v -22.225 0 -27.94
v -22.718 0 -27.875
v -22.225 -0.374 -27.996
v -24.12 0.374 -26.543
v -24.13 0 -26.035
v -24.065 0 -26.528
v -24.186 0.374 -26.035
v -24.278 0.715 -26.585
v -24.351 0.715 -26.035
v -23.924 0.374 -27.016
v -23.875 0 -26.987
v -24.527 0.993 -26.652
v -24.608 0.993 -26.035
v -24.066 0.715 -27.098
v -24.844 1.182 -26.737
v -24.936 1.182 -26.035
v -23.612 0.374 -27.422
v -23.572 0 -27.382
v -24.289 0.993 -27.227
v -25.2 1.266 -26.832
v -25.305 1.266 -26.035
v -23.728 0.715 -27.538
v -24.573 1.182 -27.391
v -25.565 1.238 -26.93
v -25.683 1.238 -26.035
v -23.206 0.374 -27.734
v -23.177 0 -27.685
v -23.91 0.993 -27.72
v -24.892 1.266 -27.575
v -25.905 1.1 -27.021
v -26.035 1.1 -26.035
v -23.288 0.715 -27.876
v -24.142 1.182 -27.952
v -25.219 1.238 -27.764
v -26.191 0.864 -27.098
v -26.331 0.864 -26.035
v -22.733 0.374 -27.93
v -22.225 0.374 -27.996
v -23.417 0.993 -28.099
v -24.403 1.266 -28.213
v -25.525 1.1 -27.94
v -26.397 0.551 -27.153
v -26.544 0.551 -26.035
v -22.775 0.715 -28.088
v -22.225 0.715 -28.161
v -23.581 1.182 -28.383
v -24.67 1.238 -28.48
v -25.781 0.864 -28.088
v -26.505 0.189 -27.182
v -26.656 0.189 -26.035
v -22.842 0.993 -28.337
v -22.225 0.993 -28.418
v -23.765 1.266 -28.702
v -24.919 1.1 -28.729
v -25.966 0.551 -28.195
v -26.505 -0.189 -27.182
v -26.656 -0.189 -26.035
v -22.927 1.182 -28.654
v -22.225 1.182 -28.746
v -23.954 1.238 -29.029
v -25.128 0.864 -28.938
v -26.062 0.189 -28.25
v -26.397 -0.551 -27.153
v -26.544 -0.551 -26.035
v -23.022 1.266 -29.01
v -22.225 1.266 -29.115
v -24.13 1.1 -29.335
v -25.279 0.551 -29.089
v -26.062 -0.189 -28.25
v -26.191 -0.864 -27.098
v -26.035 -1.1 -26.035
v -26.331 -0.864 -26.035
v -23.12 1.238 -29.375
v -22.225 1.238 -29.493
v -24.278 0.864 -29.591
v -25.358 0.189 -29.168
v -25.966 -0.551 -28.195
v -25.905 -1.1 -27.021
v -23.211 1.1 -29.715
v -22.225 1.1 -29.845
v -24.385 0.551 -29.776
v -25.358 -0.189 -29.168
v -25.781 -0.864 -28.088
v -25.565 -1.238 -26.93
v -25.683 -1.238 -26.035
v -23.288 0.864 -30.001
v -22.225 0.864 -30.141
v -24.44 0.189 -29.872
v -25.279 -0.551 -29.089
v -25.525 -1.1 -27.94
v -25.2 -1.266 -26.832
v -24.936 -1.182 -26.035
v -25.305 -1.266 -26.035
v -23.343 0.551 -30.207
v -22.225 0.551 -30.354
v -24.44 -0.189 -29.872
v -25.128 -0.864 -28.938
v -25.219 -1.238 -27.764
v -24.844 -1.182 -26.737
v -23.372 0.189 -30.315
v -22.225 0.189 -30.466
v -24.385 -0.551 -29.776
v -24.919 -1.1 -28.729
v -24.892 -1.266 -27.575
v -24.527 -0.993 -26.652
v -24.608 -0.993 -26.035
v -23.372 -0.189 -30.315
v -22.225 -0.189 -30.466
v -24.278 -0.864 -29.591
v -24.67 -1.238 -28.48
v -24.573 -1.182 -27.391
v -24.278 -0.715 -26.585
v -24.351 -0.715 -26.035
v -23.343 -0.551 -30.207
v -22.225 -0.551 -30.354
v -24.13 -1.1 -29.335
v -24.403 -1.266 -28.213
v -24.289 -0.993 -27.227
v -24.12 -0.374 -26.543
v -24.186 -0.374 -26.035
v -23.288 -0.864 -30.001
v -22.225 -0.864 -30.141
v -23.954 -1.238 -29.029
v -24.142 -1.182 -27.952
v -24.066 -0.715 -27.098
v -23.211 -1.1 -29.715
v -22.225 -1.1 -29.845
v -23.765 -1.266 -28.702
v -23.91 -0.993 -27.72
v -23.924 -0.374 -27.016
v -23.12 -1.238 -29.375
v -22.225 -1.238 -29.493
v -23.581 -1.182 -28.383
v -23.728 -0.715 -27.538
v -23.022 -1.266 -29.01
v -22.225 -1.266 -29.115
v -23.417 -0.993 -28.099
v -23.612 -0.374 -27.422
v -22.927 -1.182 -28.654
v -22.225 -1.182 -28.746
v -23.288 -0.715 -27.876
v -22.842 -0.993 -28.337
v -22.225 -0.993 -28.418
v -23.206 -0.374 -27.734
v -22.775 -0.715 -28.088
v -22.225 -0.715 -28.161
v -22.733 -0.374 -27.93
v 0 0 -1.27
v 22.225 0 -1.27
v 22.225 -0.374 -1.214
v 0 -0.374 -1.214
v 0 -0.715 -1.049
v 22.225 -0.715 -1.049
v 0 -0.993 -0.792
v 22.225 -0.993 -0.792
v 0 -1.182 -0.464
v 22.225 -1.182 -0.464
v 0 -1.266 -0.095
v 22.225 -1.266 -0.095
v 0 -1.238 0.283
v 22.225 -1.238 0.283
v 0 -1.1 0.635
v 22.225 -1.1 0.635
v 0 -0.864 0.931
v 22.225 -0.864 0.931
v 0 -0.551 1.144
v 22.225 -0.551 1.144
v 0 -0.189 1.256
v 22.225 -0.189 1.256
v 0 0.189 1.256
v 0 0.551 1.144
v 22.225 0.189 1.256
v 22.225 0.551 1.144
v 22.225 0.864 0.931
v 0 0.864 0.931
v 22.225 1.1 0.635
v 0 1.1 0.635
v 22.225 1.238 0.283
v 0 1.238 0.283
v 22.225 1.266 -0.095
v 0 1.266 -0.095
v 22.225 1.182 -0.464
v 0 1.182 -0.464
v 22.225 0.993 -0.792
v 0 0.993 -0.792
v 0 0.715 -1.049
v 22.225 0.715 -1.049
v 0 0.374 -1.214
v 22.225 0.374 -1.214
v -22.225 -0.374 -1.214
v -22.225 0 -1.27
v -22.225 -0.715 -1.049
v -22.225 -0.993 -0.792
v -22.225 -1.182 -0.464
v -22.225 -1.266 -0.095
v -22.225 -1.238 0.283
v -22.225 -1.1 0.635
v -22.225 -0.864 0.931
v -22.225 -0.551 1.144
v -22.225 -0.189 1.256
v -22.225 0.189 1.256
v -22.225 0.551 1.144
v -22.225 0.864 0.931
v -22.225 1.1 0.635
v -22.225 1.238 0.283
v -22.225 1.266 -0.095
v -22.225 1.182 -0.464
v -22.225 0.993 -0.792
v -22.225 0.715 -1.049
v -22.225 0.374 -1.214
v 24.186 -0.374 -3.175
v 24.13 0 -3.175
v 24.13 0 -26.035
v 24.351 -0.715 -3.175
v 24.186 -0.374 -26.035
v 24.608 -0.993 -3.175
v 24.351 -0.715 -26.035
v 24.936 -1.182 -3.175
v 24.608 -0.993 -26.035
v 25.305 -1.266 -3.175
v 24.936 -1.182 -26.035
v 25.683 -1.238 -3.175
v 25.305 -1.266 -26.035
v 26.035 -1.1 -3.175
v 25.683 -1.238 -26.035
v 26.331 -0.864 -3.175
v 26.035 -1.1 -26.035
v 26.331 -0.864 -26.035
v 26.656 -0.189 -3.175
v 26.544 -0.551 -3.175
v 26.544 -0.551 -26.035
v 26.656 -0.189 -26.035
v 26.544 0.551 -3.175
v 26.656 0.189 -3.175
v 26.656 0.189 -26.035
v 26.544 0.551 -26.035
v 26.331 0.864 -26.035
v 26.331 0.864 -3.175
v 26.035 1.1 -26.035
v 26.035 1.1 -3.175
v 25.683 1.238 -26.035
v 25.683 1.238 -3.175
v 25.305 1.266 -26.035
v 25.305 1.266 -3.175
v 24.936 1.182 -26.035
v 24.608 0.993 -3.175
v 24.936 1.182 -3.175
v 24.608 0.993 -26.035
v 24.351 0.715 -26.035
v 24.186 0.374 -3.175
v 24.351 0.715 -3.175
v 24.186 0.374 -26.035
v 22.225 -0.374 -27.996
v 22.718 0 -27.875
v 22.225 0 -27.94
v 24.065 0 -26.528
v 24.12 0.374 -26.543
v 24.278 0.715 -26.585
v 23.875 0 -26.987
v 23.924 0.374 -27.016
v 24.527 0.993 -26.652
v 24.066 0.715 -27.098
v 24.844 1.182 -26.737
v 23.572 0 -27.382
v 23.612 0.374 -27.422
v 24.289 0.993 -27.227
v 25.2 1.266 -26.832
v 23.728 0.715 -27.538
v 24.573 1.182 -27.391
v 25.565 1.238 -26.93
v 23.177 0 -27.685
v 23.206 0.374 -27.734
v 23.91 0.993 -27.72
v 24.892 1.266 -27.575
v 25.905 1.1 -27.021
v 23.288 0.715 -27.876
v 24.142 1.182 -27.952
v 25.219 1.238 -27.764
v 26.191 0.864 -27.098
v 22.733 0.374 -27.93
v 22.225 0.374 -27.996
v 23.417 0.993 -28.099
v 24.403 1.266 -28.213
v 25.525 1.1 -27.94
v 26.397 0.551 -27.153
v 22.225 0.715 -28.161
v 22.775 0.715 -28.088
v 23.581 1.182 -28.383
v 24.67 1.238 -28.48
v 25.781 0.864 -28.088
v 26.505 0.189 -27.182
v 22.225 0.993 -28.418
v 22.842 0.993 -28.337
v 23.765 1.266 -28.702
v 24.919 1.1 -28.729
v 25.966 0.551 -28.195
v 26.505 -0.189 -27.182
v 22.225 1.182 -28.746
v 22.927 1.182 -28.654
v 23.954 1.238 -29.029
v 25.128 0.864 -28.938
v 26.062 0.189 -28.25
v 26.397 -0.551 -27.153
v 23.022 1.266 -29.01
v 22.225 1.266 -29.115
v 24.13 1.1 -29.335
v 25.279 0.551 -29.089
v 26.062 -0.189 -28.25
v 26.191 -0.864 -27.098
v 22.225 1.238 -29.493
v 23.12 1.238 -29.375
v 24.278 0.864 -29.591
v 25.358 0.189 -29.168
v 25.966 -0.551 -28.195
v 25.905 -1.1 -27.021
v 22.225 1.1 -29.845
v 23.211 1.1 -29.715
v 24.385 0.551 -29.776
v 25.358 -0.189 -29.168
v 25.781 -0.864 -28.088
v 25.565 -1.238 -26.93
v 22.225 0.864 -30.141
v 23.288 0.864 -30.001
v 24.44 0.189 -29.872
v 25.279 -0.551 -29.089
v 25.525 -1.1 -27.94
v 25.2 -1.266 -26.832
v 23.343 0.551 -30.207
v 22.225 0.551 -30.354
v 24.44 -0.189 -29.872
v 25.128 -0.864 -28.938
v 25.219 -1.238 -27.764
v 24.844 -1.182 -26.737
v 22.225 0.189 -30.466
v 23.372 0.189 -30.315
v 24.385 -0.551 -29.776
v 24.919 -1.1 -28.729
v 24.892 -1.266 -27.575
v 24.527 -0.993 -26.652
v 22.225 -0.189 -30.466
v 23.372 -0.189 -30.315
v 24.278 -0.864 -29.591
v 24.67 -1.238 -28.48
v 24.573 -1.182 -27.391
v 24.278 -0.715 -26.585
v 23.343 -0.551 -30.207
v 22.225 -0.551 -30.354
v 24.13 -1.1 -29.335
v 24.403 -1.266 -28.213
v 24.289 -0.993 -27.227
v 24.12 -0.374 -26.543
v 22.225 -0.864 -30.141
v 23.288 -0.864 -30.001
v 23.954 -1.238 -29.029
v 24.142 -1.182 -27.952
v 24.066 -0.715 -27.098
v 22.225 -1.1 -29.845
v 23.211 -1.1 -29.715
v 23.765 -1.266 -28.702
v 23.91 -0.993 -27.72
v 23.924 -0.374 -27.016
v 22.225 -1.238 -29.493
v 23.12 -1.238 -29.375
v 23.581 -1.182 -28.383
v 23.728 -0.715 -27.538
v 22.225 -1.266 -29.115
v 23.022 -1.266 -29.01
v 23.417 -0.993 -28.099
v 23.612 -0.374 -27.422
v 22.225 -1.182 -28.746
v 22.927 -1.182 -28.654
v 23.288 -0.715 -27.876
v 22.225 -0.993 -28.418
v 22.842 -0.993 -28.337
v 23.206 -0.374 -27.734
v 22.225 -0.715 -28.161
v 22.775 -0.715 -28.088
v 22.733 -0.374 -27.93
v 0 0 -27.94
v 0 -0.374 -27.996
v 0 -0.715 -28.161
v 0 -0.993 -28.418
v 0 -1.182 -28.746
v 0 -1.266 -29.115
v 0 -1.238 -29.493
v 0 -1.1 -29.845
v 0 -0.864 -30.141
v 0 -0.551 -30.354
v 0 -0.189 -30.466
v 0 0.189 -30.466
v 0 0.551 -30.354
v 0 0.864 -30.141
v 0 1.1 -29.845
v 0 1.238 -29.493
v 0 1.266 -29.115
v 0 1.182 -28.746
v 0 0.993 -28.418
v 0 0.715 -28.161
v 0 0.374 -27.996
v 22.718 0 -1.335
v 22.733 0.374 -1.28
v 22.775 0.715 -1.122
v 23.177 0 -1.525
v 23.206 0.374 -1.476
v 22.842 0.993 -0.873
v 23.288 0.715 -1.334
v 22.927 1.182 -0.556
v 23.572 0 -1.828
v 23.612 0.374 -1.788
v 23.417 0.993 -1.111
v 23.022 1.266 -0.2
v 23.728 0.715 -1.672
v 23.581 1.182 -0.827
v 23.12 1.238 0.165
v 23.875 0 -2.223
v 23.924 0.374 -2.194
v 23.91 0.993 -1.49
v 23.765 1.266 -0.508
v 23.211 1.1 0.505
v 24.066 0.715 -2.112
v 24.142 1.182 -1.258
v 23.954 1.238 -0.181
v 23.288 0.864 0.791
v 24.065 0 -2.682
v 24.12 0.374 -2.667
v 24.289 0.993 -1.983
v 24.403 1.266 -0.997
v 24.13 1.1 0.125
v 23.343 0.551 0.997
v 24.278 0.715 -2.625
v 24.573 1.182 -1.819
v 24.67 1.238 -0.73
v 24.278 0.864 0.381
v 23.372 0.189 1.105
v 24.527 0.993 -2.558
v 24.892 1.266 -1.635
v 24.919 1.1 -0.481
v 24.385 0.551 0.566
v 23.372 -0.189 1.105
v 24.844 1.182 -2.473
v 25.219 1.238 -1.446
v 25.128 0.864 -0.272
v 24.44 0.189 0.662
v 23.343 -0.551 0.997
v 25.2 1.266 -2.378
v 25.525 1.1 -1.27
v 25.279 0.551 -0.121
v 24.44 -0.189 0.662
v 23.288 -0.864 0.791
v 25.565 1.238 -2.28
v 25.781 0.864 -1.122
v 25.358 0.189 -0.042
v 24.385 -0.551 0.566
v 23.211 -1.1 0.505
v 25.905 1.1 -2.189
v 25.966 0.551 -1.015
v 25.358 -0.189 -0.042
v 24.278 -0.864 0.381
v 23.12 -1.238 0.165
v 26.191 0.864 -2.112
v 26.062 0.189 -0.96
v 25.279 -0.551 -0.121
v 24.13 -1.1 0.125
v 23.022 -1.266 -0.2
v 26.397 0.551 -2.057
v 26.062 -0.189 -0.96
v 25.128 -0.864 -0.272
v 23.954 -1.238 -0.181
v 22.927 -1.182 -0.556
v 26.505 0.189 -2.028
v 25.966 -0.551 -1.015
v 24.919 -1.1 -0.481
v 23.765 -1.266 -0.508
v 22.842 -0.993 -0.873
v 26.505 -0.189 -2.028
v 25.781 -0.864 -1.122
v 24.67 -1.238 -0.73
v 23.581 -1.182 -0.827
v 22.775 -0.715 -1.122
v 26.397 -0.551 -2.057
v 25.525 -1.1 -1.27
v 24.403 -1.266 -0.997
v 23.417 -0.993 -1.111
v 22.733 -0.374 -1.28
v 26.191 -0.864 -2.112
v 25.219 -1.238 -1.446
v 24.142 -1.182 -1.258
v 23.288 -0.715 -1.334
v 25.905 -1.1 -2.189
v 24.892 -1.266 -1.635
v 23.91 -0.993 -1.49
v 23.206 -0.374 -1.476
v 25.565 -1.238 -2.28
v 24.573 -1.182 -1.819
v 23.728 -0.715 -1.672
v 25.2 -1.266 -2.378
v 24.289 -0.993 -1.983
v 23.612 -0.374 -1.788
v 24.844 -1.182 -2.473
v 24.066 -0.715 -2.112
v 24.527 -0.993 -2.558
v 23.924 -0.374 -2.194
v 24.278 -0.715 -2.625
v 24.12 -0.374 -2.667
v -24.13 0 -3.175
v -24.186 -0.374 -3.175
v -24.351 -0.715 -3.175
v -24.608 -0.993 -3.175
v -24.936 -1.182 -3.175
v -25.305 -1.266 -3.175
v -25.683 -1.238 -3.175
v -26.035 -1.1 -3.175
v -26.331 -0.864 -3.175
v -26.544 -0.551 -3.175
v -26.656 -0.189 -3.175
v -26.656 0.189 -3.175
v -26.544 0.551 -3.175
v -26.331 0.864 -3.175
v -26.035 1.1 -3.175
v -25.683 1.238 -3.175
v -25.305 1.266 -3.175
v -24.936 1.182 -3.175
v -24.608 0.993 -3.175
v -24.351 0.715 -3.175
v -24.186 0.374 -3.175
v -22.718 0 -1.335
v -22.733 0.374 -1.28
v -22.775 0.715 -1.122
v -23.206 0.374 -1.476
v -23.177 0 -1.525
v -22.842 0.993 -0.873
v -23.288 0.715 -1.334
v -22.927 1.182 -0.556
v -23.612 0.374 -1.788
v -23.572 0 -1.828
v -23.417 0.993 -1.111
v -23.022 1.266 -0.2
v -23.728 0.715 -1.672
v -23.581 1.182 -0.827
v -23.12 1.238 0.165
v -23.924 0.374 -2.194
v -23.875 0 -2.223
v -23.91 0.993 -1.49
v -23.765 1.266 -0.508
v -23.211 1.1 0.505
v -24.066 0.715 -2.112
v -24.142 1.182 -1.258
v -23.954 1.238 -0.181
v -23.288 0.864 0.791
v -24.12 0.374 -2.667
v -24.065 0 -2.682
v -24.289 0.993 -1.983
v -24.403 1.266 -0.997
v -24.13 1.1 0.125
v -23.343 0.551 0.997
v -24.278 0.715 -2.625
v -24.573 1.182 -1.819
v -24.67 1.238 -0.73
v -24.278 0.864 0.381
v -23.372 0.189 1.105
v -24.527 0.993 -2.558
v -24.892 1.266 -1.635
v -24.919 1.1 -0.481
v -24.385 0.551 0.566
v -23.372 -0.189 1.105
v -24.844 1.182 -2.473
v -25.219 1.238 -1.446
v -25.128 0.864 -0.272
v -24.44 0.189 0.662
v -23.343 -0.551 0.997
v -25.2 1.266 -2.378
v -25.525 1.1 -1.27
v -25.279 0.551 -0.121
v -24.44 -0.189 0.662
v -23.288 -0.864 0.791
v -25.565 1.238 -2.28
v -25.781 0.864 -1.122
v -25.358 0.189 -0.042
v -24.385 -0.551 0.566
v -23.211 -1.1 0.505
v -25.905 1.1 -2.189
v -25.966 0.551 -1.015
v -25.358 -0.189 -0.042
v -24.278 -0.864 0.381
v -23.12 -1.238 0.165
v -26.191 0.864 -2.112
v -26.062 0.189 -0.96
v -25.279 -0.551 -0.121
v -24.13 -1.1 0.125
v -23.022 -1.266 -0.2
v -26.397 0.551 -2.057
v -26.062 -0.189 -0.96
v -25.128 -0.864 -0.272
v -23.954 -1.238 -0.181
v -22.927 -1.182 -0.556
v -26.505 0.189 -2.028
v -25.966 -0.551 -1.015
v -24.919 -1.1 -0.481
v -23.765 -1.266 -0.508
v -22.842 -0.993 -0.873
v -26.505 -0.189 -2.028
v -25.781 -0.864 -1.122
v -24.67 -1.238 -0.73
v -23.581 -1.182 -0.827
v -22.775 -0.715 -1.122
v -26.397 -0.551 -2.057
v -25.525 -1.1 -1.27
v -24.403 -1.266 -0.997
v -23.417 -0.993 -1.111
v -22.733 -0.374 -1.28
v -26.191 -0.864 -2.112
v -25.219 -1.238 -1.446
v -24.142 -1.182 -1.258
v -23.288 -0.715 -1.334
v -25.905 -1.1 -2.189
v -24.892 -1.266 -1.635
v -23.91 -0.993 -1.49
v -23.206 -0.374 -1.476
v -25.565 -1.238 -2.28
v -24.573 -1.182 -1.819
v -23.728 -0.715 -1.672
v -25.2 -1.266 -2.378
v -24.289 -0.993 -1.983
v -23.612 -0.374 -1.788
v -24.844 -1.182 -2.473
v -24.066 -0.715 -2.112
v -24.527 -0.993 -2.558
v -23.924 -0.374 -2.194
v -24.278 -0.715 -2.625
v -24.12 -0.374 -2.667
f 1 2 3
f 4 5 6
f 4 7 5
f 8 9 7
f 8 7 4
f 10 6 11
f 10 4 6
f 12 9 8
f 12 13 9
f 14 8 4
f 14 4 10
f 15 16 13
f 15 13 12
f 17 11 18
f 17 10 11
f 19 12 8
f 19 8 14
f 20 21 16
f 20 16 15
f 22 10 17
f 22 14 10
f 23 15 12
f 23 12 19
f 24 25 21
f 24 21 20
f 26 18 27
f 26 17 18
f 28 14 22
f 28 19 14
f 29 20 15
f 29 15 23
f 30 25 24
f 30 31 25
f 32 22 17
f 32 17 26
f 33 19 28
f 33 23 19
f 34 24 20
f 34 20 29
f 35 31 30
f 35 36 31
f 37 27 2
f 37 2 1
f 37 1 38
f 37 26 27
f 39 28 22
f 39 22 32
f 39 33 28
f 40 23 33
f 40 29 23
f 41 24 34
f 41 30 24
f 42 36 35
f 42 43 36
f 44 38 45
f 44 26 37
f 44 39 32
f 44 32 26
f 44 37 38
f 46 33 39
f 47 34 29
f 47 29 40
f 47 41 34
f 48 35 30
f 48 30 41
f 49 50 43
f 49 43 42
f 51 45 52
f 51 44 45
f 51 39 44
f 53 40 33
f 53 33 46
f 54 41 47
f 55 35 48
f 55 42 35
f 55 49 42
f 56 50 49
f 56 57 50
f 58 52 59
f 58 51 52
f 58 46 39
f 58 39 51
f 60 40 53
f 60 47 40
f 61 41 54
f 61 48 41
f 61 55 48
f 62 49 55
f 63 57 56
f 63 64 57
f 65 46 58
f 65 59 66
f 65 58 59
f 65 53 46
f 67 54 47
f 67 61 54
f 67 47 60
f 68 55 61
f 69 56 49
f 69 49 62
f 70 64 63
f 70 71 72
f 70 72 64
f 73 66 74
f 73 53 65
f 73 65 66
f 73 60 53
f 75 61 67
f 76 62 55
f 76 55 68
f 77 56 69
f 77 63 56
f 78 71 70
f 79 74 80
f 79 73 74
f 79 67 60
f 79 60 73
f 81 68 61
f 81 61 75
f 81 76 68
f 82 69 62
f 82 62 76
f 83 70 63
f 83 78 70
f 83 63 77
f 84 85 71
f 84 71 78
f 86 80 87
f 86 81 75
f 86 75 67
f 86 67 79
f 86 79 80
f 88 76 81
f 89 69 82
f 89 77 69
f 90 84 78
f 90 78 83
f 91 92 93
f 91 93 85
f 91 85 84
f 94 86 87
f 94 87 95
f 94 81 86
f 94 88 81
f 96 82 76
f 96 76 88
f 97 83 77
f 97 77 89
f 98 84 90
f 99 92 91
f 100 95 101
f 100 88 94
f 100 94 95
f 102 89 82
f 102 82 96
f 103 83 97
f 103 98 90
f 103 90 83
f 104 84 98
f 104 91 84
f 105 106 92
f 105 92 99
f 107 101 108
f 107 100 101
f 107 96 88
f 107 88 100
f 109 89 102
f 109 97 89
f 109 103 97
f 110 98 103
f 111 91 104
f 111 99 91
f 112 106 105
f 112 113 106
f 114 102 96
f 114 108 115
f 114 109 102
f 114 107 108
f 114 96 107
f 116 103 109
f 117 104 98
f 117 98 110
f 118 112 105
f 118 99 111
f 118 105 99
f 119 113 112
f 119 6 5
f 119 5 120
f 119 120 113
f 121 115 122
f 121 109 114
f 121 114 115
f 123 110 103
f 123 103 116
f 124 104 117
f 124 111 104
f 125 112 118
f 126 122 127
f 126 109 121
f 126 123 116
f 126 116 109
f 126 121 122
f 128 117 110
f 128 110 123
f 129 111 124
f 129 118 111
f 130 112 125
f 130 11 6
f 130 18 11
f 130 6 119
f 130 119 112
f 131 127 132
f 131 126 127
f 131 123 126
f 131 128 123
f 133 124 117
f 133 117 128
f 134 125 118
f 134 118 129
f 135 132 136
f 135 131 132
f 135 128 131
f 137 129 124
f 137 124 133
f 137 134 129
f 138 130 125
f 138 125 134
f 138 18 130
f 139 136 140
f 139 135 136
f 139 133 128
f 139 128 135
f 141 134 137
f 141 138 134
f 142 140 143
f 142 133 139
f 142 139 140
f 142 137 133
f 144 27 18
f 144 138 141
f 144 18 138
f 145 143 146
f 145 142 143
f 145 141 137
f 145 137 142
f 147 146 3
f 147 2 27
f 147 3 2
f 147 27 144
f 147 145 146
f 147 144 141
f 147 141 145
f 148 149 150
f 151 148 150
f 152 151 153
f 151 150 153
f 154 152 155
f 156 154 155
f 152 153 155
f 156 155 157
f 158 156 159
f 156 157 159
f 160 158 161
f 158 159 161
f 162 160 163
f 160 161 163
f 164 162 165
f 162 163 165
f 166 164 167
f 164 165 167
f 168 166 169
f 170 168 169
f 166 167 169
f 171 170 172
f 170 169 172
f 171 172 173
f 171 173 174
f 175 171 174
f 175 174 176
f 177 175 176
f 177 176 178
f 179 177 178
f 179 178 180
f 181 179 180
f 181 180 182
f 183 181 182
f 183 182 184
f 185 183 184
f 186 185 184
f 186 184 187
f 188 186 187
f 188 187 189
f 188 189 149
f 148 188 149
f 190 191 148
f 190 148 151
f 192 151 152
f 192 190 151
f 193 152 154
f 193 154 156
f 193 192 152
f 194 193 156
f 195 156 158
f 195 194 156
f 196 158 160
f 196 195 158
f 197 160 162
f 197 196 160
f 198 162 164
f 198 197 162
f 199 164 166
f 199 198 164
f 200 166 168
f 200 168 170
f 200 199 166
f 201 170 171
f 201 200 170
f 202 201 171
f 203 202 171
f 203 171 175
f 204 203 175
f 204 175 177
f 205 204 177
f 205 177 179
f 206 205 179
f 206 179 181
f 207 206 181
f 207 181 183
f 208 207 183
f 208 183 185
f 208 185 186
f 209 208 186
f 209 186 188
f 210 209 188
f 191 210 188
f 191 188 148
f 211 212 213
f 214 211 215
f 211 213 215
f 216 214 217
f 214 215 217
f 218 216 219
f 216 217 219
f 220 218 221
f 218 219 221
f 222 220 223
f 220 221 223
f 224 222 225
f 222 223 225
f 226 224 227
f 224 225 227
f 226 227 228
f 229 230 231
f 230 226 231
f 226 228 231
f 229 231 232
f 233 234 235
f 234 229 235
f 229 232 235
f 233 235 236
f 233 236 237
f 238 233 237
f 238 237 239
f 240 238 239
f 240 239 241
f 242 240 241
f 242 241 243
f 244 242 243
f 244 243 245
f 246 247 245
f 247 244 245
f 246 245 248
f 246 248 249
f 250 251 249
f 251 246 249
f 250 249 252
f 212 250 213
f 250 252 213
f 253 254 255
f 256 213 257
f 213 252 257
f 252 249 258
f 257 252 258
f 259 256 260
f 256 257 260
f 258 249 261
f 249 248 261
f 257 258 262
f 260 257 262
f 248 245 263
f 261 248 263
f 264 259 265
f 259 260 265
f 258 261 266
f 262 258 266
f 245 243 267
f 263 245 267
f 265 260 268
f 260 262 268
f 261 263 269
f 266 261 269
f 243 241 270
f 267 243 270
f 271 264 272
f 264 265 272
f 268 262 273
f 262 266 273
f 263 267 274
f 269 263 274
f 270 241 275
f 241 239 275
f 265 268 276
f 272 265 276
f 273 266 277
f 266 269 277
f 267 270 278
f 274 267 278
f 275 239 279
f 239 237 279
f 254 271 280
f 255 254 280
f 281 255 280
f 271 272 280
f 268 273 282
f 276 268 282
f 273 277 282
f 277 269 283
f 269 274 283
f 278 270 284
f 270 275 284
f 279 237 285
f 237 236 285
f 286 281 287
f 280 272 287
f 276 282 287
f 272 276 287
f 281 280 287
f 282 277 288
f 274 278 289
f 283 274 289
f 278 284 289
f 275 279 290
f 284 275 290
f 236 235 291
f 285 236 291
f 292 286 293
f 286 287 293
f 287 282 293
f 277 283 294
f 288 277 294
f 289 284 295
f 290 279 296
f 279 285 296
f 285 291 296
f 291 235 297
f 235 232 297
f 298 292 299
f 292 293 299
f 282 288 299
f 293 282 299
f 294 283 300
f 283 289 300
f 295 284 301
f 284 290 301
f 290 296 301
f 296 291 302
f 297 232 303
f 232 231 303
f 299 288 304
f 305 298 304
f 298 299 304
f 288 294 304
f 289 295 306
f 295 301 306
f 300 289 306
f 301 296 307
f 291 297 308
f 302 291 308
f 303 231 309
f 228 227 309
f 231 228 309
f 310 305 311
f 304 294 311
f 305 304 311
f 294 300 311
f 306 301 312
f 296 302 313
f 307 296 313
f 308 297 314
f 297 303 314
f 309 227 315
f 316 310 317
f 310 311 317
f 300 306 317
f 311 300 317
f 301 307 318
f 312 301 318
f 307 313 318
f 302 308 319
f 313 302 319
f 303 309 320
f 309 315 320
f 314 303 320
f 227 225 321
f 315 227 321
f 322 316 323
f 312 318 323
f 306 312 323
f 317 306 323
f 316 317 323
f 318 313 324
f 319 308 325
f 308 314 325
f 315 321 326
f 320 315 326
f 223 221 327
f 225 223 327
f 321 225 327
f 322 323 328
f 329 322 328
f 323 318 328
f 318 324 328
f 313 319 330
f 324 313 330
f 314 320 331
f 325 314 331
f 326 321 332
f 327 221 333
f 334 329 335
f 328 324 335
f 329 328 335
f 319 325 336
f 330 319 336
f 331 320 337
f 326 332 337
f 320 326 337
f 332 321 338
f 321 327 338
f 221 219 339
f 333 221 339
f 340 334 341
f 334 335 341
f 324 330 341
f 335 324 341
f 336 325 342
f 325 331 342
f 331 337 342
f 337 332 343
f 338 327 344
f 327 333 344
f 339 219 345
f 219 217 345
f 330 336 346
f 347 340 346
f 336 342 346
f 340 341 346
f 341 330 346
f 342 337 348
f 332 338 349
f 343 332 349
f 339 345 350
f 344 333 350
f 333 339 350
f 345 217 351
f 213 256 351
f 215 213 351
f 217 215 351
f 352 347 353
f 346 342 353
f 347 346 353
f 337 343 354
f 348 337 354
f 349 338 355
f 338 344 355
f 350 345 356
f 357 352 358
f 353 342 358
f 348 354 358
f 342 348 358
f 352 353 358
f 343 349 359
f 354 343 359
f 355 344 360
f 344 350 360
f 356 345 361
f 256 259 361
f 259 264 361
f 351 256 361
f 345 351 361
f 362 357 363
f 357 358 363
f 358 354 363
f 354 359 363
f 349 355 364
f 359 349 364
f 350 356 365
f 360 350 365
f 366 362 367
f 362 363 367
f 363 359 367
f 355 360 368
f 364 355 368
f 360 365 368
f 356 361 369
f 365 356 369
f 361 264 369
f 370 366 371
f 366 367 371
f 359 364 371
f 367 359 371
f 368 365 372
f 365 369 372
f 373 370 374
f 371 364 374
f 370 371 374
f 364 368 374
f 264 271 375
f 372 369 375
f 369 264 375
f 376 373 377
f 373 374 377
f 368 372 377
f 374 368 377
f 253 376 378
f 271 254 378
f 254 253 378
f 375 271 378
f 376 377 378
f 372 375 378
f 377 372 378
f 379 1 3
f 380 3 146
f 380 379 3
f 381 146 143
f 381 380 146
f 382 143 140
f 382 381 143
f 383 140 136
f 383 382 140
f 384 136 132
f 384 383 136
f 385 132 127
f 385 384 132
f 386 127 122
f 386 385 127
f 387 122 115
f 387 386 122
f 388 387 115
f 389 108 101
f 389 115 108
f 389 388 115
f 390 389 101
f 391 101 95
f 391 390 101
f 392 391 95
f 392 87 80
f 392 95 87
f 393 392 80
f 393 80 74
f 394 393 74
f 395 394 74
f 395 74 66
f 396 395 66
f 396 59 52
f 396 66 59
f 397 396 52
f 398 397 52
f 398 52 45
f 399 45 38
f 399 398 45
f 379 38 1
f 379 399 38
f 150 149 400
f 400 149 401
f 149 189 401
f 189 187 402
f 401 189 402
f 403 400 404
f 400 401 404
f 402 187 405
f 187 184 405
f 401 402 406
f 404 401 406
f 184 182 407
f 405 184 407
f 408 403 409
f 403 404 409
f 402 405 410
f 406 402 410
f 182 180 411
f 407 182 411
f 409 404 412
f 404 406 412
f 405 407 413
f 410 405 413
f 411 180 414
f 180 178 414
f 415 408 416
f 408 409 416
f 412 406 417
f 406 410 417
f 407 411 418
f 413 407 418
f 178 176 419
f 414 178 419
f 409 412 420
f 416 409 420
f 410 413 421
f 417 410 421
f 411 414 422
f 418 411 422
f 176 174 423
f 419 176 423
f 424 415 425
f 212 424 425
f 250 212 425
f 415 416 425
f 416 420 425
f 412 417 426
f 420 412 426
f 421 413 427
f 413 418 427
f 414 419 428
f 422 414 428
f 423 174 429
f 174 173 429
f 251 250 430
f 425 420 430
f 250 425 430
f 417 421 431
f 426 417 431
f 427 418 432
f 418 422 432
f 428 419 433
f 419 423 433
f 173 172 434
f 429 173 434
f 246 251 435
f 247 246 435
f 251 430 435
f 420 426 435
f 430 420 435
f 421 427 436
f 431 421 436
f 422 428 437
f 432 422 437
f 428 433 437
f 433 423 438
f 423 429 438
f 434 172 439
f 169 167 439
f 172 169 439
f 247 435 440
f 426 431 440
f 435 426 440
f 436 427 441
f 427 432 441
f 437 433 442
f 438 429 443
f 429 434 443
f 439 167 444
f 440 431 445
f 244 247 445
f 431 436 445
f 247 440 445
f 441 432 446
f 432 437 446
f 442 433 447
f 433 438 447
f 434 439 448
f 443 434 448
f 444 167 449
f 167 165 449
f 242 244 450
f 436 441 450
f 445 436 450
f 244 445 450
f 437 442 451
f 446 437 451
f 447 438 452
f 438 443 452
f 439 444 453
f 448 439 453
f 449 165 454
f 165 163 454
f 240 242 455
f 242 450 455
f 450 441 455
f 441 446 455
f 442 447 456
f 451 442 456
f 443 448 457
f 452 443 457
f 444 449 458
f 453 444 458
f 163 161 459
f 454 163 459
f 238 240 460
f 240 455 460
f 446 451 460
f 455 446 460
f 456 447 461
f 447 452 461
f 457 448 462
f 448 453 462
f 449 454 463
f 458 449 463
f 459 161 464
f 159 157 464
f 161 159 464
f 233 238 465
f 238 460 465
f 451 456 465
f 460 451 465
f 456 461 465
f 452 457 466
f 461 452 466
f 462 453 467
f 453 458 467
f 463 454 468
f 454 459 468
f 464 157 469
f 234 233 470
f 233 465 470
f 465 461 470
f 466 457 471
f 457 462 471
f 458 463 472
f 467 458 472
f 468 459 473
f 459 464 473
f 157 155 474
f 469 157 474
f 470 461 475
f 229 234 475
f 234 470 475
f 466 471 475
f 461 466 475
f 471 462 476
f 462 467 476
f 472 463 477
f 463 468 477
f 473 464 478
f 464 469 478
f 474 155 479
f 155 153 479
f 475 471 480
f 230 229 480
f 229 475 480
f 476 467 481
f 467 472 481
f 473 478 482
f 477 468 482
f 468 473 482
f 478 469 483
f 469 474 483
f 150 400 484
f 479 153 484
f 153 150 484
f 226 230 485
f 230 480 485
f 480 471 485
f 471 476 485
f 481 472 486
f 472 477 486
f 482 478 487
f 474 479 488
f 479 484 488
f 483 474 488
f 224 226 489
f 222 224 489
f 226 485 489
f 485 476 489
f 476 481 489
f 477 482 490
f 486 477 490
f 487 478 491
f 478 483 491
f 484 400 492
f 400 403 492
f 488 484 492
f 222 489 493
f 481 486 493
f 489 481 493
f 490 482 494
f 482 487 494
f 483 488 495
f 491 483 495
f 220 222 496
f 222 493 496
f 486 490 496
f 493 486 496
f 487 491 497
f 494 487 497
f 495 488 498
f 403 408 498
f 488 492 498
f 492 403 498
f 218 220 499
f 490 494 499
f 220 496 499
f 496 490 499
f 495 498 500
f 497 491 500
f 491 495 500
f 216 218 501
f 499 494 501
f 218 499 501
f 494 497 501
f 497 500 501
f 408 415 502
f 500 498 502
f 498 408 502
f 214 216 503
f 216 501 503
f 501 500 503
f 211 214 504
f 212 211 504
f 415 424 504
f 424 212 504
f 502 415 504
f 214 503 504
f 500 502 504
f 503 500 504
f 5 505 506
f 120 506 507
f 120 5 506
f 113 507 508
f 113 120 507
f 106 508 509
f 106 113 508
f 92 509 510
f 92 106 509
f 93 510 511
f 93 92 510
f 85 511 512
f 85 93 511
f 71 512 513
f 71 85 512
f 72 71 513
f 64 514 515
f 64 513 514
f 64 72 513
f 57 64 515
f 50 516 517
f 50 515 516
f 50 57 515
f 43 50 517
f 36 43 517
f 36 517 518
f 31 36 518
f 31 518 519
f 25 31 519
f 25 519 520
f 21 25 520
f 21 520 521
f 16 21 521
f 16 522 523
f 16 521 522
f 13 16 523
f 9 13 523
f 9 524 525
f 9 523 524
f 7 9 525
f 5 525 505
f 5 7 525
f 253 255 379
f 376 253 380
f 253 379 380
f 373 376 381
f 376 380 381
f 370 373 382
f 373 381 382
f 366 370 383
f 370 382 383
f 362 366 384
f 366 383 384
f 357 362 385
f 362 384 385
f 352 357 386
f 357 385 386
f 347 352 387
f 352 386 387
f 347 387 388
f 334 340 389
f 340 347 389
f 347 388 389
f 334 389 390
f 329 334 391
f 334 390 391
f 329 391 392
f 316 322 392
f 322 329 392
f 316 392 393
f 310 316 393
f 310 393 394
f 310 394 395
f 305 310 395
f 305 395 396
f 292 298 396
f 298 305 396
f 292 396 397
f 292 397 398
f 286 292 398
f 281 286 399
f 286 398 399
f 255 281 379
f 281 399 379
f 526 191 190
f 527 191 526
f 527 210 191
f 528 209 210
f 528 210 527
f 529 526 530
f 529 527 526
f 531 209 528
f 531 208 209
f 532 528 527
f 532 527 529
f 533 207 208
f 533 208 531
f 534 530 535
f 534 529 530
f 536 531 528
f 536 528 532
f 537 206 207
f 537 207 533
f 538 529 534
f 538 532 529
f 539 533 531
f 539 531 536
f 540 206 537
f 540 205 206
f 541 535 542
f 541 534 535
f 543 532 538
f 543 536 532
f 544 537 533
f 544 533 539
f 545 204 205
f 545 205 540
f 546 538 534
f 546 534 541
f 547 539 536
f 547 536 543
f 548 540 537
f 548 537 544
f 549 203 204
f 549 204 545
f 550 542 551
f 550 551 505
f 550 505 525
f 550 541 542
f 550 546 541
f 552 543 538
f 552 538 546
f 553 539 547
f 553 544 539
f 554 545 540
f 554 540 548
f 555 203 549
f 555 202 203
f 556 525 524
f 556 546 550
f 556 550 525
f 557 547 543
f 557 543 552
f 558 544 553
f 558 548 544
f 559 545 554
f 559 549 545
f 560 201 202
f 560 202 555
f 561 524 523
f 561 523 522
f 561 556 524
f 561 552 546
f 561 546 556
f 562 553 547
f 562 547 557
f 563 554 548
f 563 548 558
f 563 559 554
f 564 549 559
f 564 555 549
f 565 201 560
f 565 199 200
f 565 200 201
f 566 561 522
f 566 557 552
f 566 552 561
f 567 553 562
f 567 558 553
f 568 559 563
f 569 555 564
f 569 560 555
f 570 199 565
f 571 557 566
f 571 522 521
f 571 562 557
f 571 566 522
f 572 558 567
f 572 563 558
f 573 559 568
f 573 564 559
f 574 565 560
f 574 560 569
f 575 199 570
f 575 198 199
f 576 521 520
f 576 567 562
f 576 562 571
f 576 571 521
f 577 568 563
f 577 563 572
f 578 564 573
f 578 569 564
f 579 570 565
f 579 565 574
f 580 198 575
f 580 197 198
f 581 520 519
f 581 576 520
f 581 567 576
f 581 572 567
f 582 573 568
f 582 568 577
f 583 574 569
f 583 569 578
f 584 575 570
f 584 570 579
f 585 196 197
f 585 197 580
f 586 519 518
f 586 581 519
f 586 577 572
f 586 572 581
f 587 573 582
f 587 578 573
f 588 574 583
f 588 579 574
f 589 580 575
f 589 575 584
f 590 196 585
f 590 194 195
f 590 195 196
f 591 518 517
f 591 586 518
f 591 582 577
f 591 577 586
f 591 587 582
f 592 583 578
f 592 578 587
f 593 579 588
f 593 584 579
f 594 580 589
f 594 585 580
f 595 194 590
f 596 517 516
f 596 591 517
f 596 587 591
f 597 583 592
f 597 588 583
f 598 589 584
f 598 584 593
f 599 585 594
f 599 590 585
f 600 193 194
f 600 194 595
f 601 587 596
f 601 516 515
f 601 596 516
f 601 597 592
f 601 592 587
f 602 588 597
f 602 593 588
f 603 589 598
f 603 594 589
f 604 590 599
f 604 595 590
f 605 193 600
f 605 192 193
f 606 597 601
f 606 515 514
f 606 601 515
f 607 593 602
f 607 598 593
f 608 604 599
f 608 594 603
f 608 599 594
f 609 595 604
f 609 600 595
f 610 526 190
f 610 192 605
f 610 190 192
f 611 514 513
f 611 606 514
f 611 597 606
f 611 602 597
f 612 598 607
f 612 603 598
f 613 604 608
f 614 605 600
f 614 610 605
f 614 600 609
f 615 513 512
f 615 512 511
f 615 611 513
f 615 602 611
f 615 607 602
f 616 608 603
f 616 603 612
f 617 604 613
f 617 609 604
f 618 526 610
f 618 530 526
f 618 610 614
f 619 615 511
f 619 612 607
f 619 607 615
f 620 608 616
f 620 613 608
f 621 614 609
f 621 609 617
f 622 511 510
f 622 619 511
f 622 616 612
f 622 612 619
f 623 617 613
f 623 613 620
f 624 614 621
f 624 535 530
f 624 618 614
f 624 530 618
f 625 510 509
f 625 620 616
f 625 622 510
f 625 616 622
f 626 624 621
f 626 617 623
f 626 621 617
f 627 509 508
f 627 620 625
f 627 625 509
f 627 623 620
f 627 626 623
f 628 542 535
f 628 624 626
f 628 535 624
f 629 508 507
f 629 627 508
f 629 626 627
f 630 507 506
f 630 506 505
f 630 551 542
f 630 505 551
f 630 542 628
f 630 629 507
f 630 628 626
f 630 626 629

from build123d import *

# Parameters (mm, degrees)
SWEEP3_PROFILE_R = 1.27


with BuildPart() as part:
    # Sweep3: sweep along a path in Sketch1
    with BuildLine(Plane(origin=(0, 0, 0), x_dir=(1, 0, 0), z_dir=(0, 1, 0))) as sweep3_path:
        Line((0, 0), (-22.225, 0))
        ThreePointArc((-22.225, 0), (-24.47006403, 0.92993597), (-25.4, 3.175))
        Line((-25.4, 3.175), (-25.4, 26.035))
        ThreePointArc((-25.4, 26.035), (-24.47006403, 28.28006403), (-22.225, 29.21))
        Line((-22.225, 29.21), (0, 29.21))
    # Sweep3 profile (on start of the path) → Sweep3 (sweep)
    with BuildSketch(Plane(origin=(0, 0, 0), x_dir=(0, 0, -1), z_dir=(-1, 0, 0))):
        Circle(SWEEP3_PROFILE_R)
    sweep3 = sweep(path=sweep3_path.line)

    # Mirror1: Sweep3 across plane
    add(sweep3.mirror(Plane(origin=(0, 0, 0), x_dir=(0, 0, 1), z_dir=(1, 0, 0))))


solid = part.part
